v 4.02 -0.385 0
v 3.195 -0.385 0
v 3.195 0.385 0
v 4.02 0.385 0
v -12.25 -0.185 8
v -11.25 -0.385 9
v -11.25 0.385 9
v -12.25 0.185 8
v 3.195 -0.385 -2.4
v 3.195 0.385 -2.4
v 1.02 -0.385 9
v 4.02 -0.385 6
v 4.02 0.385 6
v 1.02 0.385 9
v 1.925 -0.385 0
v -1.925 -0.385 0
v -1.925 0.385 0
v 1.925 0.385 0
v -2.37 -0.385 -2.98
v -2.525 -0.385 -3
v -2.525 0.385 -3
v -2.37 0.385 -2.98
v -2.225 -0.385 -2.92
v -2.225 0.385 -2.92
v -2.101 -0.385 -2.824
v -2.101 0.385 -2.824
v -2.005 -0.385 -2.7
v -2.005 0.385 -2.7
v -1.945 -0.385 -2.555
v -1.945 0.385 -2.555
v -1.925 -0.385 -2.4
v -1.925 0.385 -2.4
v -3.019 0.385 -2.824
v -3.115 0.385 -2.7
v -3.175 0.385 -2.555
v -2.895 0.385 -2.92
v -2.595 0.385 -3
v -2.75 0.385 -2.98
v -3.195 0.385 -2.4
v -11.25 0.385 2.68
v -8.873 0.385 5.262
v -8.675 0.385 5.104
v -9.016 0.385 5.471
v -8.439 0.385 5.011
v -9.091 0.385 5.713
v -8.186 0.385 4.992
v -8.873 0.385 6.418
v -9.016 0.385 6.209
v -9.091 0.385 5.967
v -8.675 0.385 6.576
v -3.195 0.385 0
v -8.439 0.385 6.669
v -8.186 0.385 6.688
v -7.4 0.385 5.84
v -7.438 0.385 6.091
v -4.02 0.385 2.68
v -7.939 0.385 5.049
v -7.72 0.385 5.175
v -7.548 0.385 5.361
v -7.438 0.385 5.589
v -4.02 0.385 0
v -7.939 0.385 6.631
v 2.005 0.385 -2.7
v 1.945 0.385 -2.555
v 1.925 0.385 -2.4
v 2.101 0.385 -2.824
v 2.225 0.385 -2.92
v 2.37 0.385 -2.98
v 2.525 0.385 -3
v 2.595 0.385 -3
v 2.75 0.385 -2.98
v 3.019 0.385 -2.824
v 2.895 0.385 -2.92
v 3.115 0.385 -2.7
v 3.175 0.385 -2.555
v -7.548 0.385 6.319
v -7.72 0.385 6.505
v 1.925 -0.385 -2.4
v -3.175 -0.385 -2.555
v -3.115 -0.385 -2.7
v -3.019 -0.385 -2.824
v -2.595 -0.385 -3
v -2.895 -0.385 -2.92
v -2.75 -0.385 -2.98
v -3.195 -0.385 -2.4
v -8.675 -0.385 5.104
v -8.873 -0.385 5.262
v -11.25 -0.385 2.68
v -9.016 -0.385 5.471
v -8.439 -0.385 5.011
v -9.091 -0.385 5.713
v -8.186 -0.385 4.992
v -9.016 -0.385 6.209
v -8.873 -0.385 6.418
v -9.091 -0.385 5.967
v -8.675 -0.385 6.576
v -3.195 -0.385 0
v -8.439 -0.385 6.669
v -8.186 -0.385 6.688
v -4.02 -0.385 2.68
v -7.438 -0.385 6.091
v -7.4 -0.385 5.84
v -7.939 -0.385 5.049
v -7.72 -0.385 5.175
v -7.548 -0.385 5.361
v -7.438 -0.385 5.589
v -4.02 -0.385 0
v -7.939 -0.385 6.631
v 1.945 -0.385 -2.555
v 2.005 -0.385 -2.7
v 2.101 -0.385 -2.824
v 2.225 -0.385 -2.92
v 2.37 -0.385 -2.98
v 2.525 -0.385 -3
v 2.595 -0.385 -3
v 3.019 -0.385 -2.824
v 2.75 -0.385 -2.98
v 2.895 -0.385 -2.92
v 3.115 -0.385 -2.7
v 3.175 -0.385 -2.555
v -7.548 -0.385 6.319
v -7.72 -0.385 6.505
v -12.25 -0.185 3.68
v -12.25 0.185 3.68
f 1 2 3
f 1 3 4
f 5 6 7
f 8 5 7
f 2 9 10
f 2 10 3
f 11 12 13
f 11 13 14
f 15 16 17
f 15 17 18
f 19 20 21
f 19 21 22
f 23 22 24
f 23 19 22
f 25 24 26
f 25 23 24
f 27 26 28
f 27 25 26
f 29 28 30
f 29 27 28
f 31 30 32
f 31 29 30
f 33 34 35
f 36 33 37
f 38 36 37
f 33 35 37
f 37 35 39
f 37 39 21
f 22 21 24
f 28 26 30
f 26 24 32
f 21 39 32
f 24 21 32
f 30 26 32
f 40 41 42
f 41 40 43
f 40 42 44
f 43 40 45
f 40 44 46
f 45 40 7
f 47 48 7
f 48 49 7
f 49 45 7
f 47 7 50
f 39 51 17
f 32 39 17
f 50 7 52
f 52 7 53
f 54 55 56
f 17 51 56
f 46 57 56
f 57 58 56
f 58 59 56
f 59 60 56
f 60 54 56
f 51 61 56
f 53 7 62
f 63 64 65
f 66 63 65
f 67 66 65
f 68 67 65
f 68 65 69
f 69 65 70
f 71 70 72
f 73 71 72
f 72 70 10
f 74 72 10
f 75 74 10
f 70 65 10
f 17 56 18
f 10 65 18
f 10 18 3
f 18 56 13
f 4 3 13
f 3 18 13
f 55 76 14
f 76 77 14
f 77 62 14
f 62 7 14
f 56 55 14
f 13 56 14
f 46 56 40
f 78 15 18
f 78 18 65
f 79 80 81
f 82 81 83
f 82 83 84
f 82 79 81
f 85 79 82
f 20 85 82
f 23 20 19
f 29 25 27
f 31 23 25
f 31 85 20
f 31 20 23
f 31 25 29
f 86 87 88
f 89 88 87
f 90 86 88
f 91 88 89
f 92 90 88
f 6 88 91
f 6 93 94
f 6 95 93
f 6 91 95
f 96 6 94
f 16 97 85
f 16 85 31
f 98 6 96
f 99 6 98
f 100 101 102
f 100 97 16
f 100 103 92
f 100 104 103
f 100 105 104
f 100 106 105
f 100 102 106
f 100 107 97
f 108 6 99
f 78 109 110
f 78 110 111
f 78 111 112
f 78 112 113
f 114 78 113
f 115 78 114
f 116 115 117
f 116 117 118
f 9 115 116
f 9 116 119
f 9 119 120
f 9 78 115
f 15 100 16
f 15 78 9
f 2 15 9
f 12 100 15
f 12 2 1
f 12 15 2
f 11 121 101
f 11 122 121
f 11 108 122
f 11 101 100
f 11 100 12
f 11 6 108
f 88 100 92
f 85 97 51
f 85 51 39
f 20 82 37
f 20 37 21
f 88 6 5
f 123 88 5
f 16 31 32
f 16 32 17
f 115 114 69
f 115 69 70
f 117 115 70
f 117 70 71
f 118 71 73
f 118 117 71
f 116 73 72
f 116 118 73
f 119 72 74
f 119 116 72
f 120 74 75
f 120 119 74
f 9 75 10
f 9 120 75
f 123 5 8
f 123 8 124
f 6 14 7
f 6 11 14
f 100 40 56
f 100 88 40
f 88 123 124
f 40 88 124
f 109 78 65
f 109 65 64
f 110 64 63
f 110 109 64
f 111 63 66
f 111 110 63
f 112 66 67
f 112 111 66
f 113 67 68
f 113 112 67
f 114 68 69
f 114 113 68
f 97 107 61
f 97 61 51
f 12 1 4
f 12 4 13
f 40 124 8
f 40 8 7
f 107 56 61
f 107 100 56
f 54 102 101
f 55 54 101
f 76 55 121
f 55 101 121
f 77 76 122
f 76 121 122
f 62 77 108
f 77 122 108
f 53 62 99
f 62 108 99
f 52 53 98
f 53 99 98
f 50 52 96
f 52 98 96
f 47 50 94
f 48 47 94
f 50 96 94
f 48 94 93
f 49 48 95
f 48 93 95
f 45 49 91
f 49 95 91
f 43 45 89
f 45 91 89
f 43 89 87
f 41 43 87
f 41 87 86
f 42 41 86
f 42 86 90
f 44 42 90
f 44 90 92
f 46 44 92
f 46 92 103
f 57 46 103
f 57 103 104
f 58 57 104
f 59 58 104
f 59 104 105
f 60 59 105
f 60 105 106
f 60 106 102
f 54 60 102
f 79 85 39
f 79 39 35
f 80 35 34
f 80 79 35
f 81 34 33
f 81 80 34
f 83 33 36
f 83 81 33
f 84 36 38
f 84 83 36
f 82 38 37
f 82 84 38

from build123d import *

# Parameters (mm, degrees)
F1_DEPTH = 0.385
F2_SIZE  = 1
F3_R     = 0.85
F4_DEPTH = 0.771
F6_DEPTH = 12.001


with BuildPart() as f1:
    # F0 (on Front) → F1 (new body, symmetric)
    with BuildSketch(Plane.XZ):
        with BuildLine():
            Line((-4.02, 2.68), (-4.02, 0))
            Line((-4.02, 0), (-3.195, 0))
            Line((-3.195, 0), (-3.195, -2.4))
            ThreePointArc((-3.195, -2.4), (-3.019264, -2.824264), (-2.595, -3))
            Line((-2.595, -3), (-2.525, -3))
            ThreePointArc((-2.525, -3), (-2.100736, -2.824264), (-1.925, -2.4))
            Line((-1.925, -2.4), (-1.925, 0))
            Line((-1.925, 0), (1.925, 0))
            Line((1.925, 0), (1.925, -2.4))
            ThreePointArc((1.925, -2.4), (2.100736, -2.824264), (2.525, -3))
            Line((2.525, -3), (2.595, -3))
            ThreePointArc((2.595, -3), (3.019264, -2.824264), (3.195, -2.4))
            Line((3.195, -2.4), (3.195, 0))
            Line((3.195, 0), (4.02, 0))
            Line((4.02, 0), (4.02, 6))
            Line((4.02, 6), (1.02, 9))
            Line((1.02, 9), (-11.25, 9))
            Line((-11.25, 9), (-12.25, 9))
            Line((-12.25, 9), (-12.25, 2.68))
            Line((-12.25, 2.68), (-11.25, 2.68))
            Line((-11.25, 2.68), (-4.02, 2.68))
        make_face()
    extrude(amount=F1_DEPTH, both=True)

    # F2
    f2_edges = [f1.edges().sort_by_distance(p)[0] for p in [
        (-12.25, 0, 9),
        (-12.25, 0, 2.68),
    ]]
    chamfer(f2_edges, length=F2_SIZE)

    # F3 (on face) → F4 (cut, through all)
    with BuildSketch(Plane.XZ.offset(0.385)):
        with Locations((-8.25, 5.84)):
            Circle(F3_R)
    extrude(amount=-F4_DEPTH, mode=Mode.SUBTRACT)

    # F5 (on face) → F6 (cut, through all)
    with BuildSketch(Plane.XY.offset(9)):
        Polygon((-12.25, 0.185), (-11.25, 0.385), (-12.25, 0.385), align=None)
        Polygon((-12.25, -0.385), (-11.25, -0.385), (-12.25, -0.185), align=None)
    extrude(amount=-F6_DEPTH, mode=Mode.SUBTRACT)


solid = f1.part
